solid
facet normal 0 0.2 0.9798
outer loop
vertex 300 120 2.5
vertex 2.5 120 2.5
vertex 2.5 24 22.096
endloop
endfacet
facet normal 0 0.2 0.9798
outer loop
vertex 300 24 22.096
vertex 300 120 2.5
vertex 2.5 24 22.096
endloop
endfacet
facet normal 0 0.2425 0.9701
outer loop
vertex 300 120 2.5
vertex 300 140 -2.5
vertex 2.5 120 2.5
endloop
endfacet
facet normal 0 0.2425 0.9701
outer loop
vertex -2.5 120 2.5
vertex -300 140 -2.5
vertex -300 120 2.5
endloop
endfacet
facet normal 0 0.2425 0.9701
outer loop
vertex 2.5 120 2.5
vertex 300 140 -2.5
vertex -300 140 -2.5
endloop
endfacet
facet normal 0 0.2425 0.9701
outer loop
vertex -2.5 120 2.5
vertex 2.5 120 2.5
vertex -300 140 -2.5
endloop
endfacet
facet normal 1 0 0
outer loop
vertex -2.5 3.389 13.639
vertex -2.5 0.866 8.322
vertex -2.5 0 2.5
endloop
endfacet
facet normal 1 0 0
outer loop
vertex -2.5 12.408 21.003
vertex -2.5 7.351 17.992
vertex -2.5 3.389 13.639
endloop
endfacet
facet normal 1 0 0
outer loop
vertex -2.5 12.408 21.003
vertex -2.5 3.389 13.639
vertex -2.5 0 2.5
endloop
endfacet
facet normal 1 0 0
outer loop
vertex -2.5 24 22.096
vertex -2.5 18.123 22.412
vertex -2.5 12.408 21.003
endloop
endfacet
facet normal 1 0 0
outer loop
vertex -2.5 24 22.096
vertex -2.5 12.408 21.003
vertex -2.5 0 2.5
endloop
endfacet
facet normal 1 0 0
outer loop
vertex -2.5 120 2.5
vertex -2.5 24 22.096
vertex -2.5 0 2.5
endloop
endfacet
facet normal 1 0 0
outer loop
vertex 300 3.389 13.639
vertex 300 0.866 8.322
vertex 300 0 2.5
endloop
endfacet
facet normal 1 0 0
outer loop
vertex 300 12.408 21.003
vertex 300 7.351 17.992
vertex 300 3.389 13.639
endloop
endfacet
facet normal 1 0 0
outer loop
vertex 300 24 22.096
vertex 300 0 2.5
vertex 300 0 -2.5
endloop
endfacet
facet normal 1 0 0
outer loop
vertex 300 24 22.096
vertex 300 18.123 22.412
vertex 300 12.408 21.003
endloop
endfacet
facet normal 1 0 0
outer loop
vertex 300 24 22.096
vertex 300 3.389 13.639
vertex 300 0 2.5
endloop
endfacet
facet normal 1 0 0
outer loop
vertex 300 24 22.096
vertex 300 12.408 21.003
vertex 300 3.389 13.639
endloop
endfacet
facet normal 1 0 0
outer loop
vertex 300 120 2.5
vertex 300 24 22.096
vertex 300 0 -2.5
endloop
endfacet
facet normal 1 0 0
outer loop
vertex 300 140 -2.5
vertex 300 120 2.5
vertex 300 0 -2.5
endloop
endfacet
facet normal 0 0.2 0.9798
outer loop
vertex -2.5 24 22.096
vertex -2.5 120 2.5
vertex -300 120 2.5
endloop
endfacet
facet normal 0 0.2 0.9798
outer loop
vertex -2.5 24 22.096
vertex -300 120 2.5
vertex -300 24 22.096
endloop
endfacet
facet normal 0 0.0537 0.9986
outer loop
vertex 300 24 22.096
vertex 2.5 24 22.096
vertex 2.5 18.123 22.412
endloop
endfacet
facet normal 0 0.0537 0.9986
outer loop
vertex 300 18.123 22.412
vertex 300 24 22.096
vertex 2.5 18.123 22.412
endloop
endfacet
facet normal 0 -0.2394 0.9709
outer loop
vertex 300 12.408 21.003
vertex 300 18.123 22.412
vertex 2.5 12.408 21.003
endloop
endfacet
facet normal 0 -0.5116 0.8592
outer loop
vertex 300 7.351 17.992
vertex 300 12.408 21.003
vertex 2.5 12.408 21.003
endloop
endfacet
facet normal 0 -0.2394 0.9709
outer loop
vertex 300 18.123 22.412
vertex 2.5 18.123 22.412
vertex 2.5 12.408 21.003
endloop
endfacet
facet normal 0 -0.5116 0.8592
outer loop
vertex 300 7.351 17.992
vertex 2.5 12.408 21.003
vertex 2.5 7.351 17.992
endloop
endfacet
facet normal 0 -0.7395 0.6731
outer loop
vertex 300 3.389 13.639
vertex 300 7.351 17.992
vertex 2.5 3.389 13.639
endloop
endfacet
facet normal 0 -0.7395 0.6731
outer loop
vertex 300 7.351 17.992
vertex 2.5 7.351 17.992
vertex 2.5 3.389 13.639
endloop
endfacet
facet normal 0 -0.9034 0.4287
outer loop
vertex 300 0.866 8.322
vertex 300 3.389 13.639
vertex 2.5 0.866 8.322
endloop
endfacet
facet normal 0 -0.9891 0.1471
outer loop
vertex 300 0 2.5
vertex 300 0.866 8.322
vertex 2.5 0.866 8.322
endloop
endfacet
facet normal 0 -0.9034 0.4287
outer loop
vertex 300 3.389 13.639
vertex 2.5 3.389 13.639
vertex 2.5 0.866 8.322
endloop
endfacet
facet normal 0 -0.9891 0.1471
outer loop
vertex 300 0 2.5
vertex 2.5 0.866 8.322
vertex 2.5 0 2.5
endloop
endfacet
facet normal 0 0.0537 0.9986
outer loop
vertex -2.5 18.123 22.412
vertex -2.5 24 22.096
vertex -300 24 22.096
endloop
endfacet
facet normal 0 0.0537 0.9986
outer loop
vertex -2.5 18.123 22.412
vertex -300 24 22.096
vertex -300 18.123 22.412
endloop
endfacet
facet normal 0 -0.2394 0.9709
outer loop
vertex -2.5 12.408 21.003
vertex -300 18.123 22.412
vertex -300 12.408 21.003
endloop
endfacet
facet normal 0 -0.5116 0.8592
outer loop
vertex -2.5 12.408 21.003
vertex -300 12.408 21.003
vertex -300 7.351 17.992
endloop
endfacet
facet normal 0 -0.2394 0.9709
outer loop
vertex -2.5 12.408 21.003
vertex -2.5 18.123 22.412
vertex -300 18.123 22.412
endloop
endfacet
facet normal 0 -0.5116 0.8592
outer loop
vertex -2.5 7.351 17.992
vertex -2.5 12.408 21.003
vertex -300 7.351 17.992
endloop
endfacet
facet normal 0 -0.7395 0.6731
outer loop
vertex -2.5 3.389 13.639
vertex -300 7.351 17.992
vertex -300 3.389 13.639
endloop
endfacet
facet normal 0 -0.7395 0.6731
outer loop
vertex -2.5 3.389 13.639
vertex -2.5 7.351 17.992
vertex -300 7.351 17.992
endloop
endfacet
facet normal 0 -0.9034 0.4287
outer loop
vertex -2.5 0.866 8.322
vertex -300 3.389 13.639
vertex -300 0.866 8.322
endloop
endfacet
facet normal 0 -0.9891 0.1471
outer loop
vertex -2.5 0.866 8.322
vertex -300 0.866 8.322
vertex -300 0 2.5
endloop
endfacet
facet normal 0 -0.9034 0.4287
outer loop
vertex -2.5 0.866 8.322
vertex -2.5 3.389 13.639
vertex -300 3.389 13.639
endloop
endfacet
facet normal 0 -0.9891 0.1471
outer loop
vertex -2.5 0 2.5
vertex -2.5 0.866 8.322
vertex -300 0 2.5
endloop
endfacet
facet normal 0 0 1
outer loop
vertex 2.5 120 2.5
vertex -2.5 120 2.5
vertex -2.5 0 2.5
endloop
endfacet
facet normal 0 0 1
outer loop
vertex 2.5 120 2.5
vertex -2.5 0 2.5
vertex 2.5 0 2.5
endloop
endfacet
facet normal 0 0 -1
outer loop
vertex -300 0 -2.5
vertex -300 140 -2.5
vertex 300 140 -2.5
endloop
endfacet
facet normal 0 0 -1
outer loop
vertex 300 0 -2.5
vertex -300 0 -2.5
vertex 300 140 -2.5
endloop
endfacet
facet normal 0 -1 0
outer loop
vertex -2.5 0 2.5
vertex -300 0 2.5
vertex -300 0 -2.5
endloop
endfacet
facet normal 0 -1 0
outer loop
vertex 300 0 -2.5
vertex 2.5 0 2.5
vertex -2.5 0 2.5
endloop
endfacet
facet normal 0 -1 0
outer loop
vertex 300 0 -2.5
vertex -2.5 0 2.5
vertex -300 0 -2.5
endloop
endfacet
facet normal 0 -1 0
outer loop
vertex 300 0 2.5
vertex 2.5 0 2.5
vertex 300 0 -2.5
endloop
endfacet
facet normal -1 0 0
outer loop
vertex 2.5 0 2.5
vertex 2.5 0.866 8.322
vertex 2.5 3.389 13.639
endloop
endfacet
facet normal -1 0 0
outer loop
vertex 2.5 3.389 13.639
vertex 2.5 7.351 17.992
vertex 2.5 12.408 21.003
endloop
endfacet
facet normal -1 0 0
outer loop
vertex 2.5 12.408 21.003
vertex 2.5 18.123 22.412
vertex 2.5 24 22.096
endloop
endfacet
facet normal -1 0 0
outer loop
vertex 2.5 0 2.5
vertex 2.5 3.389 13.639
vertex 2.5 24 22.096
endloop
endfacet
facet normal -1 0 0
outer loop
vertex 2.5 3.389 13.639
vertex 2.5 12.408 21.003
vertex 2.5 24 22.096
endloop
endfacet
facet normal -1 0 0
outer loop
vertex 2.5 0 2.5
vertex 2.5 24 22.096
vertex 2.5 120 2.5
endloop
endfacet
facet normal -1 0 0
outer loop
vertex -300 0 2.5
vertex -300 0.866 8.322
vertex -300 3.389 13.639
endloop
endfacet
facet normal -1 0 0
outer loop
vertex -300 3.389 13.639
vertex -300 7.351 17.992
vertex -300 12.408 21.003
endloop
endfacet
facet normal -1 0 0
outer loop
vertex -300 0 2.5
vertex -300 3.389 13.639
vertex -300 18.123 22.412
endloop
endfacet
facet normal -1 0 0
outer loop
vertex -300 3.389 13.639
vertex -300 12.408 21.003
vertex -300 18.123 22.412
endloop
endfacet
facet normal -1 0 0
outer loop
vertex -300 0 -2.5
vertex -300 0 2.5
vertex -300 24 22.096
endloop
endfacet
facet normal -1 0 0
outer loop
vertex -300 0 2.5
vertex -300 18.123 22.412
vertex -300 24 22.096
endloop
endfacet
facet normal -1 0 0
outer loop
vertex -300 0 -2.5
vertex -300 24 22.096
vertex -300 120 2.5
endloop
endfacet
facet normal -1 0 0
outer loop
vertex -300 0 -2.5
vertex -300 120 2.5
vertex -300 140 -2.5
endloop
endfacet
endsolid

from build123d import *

# Parameters (mm, degrees)
F3_DEPTH  = 2.5
F5_DEPTH  = 297.5
F8_DEPTH  = 600
F10_DEPTH = 297.5


with BuildPart() as f3:
    # F0 (on Top) → F3 (new body, symmetric)
    with BuildSketch(Plane.XY):
        Polygon((-300, 0), (0, 0), (300, 0), (300, 140), (-300, 140), align=None)
    extrude(amount=F3_DEPTH, both=True)

    # F4 (on offset) → F5 (join)
    with BuildSketch(Plane.YZ.offset(2.5)):
        Polygon((0, 2.5), (0, 0), (0, -2.5), (140, -2.5), (120, 2.5), align=None)
        with BuildLine():
            ThreePointArc((24, 22.0959179423), (7.3508893593, 17.9919333848), (0, 2.5))
            Line((0, 2.5), (120, 2.5))
            Line((120, 2.5), (24, 22.0959179423))
        make_face()
        Polygon((140, 2.5), (120, 2.5), (140, -2.5), align=None)
    extrude(amount=F5_DEPTH)

    # F7 (on offset) → F8 (cut)
    with BuildSketch(Plane(origin=(-300, 0, 0), x_dir=(0, -1, 0), z_dir=(-1, 0, 0))):
        Polygon((-140, -2.5), (-120, 2.5), (-140, 2.5), align=None)
    extrude(amount=-F8_DEPTH, mode=Mode.SUBTRACT)

    # F9 (on offset) → F10 (join)
    with BuildSketch(Plane.YZ.offset(-2.5)):
        with BuildLine():
            ThreePointArc((24, 22.0959179423), (7.3508893593, 17.9919333848), (0, 2.5))
            Line((0, 2.5), (120, 2.5))
            Line((120, 2.5), (24, 22.0959179423))
        make_face()
        Polygon((0, 2.5), (0, 0), (0, -2.5), (140, -2.5), (120, 2.5), align=None)
    extrude(amount=-F10_DEPTH)


solid = f3.part
